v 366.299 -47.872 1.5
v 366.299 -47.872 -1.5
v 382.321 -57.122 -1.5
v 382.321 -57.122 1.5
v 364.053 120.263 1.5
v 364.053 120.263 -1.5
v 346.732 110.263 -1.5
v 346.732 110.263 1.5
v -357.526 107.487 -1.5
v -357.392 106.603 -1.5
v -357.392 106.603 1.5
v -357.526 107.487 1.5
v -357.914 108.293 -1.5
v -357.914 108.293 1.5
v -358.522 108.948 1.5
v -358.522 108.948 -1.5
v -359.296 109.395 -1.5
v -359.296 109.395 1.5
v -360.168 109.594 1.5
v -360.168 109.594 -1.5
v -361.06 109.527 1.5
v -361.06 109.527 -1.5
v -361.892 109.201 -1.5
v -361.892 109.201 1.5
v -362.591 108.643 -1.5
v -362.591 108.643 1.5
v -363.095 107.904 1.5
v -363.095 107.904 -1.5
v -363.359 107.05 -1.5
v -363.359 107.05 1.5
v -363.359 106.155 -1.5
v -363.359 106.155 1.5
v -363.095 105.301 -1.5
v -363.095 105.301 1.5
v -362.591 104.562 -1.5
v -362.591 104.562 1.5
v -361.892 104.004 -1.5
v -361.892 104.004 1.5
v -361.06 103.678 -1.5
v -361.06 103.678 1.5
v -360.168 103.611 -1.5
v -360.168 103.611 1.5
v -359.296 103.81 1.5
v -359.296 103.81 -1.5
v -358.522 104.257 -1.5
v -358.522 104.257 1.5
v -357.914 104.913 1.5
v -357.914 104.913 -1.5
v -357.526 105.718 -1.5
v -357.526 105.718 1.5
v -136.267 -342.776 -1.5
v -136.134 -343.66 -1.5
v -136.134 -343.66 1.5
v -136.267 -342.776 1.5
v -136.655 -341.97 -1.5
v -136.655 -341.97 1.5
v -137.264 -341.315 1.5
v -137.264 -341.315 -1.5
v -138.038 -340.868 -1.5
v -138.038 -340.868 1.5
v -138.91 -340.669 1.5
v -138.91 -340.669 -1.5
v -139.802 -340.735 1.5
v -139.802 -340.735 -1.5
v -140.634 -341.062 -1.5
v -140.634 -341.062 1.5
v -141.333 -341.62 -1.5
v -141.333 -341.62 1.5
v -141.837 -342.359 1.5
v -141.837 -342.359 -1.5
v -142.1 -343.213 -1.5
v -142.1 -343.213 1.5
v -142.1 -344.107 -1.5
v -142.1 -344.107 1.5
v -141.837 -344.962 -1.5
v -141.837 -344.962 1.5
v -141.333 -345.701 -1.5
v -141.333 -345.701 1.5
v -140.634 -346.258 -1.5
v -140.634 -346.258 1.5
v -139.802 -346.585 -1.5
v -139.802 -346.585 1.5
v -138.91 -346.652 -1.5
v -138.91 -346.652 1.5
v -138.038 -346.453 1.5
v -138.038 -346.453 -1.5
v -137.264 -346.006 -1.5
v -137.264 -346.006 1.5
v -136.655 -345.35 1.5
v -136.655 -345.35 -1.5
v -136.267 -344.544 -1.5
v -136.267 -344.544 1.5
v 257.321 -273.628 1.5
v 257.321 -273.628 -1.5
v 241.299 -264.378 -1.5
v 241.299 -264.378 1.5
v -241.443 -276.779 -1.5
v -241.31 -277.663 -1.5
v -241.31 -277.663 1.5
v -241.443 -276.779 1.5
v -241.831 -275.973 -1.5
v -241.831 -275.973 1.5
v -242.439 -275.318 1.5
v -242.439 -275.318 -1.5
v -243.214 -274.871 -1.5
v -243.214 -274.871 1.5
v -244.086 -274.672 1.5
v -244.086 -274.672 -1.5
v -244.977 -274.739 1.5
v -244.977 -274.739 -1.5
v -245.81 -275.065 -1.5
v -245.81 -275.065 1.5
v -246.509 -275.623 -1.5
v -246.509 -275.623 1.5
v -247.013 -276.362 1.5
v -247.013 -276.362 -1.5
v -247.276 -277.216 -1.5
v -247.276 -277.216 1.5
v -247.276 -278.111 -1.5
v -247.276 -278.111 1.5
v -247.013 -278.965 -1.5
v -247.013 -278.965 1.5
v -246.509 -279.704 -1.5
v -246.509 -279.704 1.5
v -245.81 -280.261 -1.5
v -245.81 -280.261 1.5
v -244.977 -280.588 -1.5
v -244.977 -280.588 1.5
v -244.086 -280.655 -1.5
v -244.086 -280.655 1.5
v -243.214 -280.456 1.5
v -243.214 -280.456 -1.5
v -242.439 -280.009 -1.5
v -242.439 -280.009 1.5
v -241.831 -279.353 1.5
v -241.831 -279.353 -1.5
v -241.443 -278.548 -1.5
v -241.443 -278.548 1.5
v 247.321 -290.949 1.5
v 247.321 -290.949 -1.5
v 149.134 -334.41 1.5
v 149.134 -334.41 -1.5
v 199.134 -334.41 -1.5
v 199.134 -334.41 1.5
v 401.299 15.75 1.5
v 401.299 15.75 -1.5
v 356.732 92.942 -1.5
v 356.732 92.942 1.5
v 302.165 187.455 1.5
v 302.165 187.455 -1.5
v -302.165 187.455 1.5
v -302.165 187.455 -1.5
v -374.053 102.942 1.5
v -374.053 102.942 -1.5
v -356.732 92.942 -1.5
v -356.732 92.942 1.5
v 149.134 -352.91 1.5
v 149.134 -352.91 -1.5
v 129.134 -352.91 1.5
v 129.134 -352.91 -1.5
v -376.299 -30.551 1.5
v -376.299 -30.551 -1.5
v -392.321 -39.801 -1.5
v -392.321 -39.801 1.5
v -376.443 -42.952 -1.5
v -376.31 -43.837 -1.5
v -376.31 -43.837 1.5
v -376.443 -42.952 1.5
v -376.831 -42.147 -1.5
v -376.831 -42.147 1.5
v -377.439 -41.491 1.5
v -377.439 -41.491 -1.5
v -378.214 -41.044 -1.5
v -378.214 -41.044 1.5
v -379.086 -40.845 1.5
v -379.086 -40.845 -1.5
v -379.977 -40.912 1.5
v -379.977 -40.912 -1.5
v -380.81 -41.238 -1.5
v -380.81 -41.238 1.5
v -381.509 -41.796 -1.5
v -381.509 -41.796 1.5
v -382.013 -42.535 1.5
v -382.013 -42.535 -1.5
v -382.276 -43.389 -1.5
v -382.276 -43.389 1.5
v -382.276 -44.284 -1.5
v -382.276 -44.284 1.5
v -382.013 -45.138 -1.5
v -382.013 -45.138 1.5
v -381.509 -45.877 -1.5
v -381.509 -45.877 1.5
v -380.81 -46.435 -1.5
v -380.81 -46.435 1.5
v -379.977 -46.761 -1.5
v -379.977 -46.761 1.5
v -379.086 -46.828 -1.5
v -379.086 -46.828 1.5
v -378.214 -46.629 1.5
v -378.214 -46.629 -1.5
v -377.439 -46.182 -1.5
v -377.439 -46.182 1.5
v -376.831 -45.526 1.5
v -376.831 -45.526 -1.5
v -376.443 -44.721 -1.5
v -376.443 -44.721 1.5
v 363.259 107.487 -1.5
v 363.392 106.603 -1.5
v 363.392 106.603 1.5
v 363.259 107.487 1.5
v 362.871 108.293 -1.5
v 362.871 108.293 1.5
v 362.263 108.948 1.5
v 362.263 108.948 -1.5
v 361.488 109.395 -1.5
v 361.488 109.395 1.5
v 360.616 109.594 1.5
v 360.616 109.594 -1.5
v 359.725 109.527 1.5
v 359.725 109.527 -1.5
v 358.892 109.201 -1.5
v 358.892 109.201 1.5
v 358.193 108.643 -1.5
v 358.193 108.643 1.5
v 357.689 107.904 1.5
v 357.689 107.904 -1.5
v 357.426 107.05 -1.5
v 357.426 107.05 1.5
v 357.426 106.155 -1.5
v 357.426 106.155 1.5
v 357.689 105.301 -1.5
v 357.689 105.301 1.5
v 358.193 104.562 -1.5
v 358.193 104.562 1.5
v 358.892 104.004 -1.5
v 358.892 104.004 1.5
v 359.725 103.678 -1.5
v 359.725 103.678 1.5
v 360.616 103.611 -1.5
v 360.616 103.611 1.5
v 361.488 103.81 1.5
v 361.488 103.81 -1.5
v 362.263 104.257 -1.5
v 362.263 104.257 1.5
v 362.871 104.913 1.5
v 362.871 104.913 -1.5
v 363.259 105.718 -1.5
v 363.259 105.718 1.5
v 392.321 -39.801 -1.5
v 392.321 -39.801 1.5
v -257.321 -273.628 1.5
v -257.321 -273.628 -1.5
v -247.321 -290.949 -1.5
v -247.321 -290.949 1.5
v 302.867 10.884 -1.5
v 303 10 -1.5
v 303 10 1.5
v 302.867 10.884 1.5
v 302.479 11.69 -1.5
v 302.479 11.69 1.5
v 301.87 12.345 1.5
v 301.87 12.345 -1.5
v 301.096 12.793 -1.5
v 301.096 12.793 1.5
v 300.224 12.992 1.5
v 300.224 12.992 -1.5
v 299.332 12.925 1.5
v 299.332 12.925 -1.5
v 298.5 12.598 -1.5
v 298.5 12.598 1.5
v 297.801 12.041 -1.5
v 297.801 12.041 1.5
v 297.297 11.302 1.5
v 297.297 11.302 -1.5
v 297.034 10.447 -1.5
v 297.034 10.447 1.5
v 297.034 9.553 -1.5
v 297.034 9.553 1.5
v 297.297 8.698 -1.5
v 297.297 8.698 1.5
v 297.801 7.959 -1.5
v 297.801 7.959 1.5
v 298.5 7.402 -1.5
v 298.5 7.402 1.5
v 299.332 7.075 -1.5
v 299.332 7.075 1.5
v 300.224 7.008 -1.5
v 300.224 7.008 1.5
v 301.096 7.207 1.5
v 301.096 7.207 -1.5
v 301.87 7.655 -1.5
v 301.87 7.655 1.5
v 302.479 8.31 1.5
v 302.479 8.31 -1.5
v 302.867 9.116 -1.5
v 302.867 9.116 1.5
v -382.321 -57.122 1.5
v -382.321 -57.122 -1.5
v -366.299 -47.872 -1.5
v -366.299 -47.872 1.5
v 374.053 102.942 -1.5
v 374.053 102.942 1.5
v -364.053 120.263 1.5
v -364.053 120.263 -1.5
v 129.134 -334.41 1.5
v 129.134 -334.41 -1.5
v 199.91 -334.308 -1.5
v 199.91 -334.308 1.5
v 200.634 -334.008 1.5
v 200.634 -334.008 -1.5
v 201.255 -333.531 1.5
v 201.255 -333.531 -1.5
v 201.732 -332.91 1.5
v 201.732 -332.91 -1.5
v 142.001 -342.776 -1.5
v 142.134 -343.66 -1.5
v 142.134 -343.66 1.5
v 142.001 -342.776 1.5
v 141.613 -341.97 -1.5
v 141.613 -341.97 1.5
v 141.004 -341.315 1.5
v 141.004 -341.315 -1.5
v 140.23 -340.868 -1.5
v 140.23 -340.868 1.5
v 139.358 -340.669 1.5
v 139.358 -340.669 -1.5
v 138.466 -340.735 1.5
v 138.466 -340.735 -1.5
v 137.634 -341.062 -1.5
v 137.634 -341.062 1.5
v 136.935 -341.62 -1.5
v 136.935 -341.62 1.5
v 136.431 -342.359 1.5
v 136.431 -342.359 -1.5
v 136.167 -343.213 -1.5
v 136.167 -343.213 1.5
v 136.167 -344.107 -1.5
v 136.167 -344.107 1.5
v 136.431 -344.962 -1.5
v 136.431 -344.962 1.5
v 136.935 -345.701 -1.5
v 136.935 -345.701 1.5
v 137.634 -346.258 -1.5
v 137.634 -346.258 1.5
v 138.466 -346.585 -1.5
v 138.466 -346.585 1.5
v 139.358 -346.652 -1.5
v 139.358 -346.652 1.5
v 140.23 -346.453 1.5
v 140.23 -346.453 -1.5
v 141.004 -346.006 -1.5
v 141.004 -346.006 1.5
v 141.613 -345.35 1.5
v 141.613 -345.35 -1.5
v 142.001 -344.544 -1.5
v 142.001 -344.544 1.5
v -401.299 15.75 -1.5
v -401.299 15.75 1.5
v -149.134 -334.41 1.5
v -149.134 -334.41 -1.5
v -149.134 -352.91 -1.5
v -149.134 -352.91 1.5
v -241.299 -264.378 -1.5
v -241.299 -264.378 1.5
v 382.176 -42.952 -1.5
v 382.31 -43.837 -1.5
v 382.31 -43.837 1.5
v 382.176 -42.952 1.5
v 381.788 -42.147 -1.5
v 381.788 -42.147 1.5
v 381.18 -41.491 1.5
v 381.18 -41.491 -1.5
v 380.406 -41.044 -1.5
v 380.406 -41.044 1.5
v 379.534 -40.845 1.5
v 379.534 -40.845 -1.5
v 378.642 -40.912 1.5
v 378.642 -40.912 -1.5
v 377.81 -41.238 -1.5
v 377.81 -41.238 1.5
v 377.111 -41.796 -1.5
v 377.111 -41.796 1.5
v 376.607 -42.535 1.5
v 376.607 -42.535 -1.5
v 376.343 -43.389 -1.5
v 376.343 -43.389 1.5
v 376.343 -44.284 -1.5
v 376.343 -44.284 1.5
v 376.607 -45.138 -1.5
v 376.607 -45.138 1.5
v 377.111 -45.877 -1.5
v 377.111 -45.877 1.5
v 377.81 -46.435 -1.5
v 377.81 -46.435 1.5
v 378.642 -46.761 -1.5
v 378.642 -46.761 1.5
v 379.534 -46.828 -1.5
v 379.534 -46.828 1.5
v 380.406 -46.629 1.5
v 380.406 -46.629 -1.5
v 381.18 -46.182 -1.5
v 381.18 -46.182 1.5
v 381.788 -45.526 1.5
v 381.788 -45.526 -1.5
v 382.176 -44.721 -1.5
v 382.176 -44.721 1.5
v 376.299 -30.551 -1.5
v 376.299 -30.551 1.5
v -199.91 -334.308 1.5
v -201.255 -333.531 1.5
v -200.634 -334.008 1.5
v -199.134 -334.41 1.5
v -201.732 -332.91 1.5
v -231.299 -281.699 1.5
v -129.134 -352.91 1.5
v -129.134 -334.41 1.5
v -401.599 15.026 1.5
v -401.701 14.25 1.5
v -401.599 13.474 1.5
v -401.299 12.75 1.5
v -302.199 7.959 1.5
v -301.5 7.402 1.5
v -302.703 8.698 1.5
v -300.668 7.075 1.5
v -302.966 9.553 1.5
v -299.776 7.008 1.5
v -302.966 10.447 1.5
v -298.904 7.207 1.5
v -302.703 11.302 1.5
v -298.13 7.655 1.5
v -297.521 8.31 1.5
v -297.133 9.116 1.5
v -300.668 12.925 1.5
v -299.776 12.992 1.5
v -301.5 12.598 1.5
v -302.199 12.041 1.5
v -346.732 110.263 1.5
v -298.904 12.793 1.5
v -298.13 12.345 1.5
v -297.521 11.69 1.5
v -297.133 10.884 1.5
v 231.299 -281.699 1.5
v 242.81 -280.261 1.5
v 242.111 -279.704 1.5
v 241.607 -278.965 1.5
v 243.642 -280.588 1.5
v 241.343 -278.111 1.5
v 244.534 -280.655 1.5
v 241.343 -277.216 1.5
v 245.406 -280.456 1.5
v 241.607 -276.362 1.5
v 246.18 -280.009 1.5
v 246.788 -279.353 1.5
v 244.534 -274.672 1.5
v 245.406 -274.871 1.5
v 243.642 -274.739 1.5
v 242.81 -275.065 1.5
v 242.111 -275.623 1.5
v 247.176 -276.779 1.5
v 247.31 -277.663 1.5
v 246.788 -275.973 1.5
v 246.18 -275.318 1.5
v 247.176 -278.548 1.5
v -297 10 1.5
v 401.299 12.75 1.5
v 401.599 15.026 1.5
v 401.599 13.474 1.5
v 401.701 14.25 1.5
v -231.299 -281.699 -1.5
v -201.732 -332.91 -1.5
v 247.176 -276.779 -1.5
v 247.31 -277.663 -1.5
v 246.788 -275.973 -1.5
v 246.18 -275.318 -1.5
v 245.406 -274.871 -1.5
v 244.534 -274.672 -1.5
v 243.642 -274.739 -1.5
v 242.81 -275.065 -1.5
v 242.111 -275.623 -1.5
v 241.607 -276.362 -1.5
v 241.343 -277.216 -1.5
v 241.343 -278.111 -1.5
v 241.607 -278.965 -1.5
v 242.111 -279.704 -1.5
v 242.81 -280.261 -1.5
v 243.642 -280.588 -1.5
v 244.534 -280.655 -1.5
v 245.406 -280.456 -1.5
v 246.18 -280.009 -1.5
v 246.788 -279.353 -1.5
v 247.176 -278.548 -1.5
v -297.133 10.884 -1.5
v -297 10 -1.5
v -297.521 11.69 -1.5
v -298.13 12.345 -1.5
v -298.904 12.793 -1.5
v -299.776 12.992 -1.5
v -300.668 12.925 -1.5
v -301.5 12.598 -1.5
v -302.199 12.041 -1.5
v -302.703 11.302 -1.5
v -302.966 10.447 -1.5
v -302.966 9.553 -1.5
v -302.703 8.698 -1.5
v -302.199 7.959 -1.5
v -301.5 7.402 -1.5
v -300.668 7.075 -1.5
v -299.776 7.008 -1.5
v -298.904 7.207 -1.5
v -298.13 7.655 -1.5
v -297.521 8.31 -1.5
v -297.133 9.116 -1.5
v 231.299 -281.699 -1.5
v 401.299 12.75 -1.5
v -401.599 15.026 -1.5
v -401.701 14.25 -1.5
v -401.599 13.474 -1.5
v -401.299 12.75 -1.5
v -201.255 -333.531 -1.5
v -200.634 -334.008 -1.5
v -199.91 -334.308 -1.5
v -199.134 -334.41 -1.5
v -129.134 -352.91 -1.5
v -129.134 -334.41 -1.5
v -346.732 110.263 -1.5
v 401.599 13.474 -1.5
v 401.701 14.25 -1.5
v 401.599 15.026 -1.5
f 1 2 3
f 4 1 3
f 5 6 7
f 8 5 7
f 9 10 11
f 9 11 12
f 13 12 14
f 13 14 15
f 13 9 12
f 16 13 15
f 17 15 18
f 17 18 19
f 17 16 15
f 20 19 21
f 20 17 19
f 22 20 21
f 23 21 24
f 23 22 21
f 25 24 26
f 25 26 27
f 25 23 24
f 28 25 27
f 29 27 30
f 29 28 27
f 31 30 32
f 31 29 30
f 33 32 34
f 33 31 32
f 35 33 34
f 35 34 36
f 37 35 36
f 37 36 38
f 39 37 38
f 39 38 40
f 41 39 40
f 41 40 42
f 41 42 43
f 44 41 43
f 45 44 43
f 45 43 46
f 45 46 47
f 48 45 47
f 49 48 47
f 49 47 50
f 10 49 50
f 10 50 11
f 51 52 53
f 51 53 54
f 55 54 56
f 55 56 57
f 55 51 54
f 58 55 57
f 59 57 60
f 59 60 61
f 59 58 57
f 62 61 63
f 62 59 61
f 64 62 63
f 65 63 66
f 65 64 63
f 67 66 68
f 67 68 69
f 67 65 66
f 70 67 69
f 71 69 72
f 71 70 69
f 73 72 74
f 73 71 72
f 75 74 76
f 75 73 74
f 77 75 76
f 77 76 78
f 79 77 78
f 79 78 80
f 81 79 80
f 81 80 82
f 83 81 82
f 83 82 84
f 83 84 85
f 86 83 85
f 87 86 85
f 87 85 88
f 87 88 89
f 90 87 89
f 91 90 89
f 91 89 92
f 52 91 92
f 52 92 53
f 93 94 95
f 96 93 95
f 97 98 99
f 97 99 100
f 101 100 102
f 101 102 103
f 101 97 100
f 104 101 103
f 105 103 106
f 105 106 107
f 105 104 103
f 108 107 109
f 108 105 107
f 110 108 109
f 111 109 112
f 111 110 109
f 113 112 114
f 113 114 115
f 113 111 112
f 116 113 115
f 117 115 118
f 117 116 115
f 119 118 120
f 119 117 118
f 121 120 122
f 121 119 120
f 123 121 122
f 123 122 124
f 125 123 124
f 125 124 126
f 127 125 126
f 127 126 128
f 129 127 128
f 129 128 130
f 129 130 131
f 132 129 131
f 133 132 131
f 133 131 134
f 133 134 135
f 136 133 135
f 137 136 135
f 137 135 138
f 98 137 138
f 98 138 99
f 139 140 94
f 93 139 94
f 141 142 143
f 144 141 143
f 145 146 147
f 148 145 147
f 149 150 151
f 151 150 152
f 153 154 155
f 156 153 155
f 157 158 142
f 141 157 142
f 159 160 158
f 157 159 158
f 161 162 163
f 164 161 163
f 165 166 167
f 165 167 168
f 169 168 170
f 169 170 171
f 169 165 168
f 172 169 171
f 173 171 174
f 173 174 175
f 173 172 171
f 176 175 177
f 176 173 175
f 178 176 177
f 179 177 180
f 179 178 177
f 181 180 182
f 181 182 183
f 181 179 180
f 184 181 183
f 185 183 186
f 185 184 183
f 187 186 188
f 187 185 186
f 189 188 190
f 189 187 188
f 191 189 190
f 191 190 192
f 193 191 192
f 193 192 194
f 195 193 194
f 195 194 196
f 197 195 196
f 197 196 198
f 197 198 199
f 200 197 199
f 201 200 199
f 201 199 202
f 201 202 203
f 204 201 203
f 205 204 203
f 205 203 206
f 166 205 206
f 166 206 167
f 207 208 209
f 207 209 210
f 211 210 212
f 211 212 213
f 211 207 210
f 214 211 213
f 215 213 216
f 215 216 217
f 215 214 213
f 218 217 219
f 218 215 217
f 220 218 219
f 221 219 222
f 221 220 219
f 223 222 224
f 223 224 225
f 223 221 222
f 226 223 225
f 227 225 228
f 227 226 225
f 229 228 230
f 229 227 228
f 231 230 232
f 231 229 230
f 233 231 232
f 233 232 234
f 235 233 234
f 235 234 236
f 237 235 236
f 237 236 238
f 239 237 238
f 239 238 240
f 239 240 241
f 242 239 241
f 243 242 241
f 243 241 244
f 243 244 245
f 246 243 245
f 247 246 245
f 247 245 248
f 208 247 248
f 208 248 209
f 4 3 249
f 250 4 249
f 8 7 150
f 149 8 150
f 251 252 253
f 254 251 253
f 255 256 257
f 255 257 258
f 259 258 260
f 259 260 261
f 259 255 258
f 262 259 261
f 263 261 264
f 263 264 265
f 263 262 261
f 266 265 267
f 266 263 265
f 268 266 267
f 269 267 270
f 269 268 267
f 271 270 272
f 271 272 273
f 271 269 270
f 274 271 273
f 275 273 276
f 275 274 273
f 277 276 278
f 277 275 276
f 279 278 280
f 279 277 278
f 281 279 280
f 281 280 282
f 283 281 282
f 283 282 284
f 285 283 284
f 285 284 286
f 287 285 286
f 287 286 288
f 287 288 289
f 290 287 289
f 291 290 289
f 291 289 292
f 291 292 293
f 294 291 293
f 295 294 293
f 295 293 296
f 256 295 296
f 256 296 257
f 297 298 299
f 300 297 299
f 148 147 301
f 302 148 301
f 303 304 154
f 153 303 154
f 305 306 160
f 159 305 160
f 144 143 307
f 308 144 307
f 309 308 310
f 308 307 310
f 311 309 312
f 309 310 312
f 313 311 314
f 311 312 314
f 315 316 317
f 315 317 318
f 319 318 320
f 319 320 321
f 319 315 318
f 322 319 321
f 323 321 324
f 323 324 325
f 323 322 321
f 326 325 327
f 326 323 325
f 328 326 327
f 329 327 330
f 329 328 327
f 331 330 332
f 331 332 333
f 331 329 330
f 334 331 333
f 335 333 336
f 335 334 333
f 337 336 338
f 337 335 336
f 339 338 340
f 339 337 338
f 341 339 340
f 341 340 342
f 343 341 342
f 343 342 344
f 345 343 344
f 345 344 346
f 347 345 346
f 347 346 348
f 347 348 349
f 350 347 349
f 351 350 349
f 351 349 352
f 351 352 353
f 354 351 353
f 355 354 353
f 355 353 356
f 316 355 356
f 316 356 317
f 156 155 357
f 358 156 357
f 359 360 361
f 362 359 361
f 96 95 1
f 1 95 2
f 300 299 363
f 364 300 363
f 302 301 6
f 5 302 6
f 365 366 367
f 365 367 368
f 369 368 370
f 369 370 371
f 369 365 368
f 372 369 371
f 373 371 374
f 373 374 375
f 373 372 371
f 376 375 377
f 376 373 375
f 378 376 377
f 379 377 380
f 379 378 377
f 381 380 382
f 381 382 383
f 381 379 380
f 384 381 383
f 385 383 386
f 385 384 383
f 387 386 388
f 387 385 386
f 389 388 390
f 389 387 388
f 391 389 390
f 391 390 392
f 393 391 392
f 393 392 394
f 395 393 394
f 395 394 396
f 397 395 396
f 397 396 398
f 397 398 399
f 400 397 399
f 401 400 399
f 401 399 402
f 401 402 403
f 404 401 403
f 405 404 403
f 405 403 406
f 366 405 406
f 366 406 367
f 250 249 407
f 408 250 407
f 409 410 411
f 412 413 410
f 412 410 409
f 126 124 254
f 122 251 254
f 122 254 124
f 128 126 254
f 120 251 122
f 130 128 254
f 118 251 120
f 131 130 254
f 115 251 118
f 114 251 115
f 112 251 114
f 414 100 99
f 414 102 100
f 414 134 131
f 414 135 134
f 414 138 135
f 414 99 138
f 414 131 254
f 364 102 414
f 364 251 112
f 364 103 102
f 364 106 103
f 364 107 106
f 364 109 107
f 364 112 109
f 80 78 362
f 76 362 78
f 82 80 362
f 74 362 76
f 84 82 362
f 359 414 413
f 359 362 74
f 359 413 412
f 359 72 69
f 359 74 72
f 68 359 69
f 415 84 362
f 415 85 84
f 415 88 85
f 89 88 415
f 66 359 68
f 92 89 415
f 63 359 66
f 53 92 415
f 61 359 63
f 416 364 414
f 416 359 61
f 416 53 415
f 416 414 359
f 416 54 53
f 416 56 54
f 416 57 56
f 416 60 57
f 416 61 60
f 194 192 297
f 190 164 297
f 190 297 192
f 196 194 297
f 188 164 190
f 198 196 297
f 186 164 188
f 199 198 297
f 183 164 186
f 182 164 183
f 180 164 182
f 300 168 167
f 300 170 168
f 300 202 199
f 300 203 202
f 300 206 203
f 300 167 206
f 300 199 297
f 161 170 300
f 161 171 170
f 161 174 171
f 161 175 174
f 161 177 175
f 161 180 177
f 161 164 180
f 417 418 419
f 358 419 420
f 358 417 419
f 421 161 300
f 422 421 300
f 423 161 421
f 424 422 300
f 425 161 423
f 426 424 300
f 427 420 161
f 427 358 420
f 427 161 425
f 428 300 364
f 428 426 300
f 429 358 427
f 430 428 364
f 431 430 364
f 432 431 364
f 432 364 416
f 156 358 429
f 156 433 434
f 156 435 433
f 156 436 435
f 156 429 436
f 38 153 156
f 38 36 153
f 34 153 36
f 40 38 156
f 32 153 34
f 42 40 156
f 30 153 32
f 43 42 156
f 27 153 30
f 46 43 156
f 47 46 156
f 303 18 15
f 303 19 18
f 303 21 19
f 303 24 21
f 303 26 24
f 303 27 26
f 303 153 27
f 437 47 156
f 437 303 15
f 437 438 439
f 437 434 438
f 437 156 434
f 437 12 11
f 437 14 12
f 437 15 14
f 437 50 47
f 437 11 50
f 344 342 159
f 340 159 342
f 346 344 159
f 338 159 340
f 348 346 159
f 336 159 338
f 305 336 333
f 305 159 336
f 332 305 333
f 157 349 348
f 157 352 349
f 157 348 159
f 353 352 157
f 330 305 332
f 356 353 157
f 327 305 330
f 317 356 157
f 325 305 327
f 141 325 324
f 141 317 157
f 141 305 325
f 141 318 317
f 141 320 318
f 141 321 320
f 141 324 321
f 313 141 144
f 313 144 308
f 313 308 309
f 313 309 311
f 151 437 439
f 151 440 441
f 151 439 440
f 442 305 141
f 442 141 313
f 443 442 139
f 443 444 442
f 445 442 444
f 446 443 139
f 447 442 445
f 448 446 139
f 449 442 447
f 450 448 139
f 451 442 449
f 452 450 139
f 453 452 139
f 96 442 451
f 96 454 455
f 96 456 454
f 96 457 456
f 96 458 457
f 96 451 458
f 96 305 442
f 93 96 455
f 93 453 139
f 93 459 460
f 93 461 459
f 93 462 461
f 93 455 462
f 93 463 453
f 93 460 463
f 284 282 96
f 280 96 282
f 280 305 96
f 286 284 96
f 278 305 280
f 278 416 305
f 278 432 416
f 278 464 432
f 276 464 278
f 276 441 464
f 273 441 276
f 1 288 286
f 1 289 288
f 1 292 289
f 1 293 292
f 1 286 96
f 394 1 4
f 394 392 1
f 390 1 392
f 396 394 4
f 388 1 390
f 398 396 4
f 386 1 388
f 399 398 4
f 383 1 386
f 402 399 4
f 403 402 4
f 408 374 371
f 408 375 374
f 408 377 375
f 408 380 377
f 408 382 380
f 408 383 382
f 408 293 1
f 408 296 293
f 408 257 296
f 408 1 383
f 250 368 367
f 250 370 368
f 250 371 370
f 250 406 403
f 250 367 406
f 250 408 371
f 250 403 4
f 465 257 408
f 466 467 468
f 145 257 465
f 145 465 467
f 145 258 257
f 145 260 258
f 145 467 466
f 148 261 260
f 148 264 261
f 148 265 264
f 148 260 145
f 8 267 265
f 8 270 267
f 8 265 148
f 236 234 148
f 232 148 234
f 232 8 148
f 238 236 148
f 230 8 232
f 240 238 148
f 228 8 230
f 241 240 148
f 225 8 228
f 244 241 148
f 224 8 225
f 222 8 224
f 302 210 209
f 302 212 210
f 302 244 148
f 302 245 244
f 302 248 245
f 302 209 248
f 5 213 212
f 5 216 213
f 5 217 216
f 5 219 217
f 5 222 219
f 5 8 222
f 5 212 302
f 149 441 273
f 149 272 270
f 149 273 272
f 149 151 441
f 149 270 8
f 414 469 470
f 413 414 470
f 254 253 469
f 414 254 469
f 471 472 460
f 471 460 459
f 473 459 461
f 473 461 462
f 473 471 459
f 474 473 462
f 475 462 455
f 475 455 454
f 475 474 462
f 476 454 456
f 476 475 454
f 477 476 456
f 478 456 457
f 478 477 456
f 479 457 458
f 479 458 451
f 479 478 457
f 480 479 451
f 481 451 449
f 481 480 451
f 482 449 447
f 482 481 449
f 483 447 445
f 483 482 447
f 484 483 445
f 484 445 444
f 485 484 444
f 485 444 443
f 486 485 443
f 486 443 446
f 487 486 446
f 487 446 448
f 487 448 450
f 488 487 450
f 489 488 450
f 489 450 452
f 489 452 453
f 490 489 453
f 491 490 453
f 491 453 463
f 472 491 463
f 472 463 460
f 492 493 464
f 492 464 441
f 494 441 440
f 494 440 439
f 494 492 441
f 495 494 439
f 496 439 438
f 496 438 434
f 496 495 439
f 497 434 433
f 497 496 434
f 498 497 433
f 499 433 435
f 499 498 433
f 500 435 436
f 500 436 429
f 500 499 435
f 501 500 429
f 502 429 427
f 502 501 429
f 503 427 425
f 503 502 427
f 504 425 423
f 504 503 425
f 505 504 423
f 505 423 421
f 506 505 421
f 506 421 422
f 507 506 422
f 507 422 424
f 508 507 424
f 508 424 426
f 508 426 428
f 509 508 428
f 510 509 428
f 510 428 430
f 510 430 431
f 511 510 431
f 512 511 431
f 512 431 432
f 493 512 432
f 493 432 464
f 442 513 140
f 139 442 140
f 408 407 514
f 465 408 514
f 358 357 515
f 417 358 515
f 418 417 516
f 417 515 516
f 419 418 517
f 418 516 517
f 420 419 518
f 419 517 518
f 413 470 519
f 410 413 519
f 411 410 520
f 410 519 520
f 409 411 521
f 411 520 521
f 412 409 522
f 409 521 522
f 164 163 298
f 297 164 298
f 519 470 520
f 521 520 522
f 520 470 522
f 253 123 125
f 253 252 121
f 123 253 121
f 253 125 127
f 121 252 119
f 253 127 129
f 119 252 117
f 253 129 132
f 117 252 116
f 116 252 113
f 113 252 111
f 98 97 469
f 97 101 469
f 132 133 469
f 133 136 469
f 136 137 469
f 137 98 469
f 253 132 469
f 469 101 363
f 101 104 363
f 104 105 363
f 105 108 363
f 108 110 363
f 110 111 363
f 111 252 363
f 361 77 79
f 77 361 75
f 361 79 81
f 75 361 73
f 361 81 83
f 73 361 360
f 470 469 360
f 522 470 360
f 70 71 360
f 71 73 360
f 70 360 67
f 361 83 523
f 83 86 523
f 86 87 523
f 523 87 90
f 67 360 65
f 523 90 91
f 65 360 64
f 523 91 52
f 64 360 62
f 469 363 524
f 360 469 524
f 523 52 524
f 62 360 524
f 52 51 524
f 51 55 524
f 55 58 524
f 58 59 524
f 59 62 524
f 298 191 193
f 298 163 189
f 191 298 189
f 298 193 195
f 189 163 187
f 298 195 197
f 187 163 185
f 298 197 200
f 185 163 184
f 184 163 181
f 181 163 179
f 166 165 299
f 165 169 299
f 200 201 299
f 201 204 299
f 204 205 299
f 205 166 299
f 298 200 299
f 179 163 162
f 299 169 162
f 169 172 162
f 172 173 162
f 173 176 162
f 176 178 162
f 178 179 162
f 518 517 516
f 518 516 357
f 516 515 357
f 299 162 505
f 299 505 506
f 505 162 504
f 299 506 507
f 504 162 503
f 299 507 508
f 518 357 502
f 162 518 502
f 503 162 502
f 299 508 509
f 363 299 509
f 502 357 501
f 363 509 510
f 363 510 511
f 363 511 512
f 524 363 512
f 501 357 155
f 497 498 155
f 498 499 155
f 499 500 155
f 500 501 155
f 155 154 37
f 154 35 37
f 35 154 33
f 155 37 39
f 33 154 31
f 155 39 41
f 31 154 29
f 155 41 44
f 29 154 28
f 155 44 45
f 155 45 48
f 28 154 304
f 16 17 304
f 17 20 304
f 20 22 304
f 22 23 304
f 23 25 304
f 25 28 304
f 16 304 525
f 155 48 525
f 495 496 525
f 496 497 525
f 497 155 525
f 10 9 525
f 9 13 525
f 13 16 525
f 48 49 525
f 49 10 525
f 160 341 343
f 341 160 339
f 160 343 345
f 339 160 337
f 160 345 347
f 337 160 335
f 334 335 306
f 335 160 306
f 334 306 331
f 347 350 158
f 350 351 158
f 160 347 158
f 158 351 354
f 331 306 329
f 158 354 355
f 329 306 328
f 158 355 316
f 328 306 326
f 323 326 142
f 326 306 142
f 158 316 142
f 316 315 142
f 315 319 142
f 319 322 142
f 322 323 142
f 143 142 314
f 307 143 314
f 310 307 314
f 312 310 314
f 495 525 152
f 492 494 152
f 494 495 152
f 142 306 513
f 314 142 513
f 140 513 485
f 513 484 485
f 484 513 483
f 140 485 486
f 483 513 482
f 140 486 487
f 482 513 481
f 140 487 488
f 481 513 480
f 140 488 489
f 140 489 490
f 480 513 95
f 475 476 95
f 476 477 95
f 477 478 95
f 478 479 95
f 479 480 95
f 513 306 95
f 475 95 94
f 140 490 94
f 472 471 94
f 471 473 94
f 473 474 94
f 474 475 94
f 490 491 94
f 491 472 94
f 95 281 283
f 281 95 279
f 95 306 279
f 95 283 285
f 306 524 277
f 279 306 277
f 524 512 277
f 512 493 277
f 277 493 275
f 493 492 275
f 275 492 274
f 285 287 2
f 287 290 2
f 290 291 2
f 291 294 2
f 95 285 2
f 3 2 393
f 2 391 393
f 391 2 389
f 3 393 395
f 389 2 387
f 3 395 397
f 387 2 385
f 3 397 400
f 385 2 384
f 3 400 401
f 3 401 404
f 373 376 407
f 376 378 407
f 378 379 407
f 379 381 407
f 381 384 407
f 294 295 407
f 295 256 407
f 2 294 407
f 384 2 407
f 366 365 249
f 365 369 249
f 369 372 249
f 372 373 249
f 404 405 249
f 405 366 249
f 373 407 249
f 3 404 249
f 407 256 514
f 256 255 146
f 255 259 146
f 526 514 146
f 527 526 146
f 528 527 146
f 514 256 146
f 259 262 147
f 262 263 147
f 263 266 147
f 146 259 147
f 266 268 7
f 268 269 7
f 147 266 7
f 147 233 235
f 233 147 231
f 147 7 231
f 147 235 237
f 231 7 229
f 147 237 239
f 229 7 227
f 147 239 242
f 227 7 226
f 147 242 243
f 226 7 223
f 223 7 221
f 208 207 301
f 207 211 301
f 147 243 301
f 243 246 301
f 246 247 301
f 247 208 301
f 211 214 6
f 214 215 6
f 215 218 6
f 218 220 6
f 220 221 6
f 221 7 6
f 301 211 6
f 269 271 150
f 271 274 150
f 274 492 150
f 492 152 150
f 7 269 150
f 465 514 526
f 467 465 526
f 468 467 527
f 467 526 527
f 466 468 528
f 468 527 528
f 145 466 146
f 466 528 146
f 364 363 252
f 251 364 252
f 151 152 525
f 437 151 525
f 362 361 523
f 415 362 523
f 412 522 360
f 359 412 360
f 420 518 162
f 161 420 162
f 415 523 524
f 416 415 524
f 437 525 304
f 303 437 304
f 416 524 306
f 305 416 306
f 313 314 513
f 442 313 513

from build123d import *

# Parameters (mm, degrees)
SKETCH_1_R              = 3
EXTRUDE_1_DEPTH         = 1.5
SHEET_START             = -1.5
SHEET_METAL_1_OUTLINE_R = 3
SHEET_METAL_1_DEPTH     = 1.5


# Read off the part's stored shape, not the designer's step: Преобразовать-Твердое тело1
with BuildPart() as part:
    # Sketch 1 → Бобышка-Вытянуть1 (new body)
    with BuildSketch(Plane.XY):
        with BuildLine():
            Line((201.732050808, -332.910161514), (231.299038106, -281.698637287))
            Line((231.299038106, -281.698637287), (247.320508076, -290.948637287))
            Line((247.320508076, -290.948637287), (257.320508076, -273.628129211))
            Line((257.320508076, -273.628129211), (241.299038106, -264.378129211))
            Line((241.299038106, -264.378129211), (366.299038106, -47.871778265))
            Line((366.299038106, -47.871778265), (382.320508076, -57.121778265))
            Line((382.320508076, -57.121778265), (392.320508076, -39.801270189))
            Line((392.320508076, -39.801270189), (376.299038106, -30.551270189))
            Line((376.299038106, -30.551270189), (401.299038106, 12.75))
            ThreePointArc((401.299038106, 12.75), (401.700961894, 14.25), (401.299038106, 15.75))
            Line((401.299038106, 15.75), (356.732050808, 92.942286341))
            Line((356.732050808, 92.942286341), (374.052558883, 102.942286341))
            Line((374.052558883, 102.942286341), (364.052558883, 120.262794416))
            Line((364.052558883, 120.262794416), (346.732050808, 110.262794416))
            Line((346.732050808, 110.262794416), (302.165063509, 187.455080757))
            Line((302.165063509, 187.455080757), (-302.165063509, 187.455080757))
            Line((-302.165063509, 187.455080757), (-346.732050808, 110.262794416))
            Line((-346.732050808, 110.262794416), (-364.052558883, 120.262794416))
            Line((-364.052558883, 120.262794416), (-374.052558883, 102.942286341))
            Line((-374.052558883, 102.942286341), (-356.732050808, 92.942286341))
            Line((-356.732050808, 92.942286341), (-401.299038106, 15.75))
            ThreePointArc((-401.299038106, 15.75), (-401.700961894, 14.25), (-401.299038106, 12.75))
            Line((-401.299038106, 12.75), (-376.299038106, -30.551270189))
            Line((-376.299038106, -30.551270189), (-392.320508076, -39.801270189))
            Line((-392.320508076, -39.801270189), (-382.320508076, -57.121778265))
            Line((-382.320508076, -57.121778265), (-366.299038106, -47.871778265))
            Line((-366.299038106, -47.871778265), (-241.299038106, -264.378129211))
            Line((-241.299038106, -264.378129211), (-257.320508076, -273.628129211))
            Line((-257.320508076, -273.628129211), (-247.320508076, -290.948637287))
            Line((-247.320508076, -290.948637287), (-231.299038106, -281.698637287))
            Line((-231.299038106, -281.698637287), (-201.732050808, -332.910161514))
            ThreePointArc((-201.732050808, -332.910161514), (-200.633974596, -334.008237725), (-199.133974596, -334.410161514))
            Line((-199.133974596, -334.410161514), (-149.133974596, -334.410161514))
            Line((-149.133974596, -334.410161514), (-149.133974596, -352.910161514))
            Line((-149.133974596, -352.910161514), (-129.133974596, -352.910161514))
            Line((-129.133974596, -352.910161514), (-129.133974596, -334.410161514))
            Line((-129.133974596, -334.410161514), (129.133974596, -334.410161514))
            Line((129.133974596, -334.410161514), (129.133974596, -352.910161514))
            Line((129.133974596, -352.910161514), (149.133974596, -352.910161514))
            Line((149.133974596, -352.910161514), (149.133974596, -334.410161514))
            Line((149.133974596, -334.410161514), (199.133974596, -334.410161514))
            ThreePointArc((199.133974596, -334.410161514), (200.633974596, -334.008237725), (201.732050808, -332.910161514))
        make_face()
        with Locations((244.309773091, -277.663383249)):
            Circle(SKETCH_1_R, mode=Mode.SUBTRACT)
        with Locations((379.309773091, -43.836524227)):
            Circle(SKETCH_1_R, mode=Mode.SUBTRACT)
        with Locations((139.133974596, -343.660161514)):
            Circle(SKETCH_1_R, mode=Mode.SUBTRACT)
        with Locations((-139.133974596, -343.660161514)):
            Circle(SKETCH_1_R, mode=Mode.SUBTRACT)
        with Locations((-244.309773091, -277.663383249)):
            Circle(SKETCH_1_R, mode=Mode.SUBTRACT)
        with Locations((-379.309773091, -43.836524227)):
            Circle(SKETCH_1_R, mode=Mode.SUBTRACT)
        with Locations((300, 10)):
            Circle(SKETCH_1_R, mode=Mode.SUBTRACT)
        with Locations((-300, 10)):
            Circle(SKETCH_1_R, mode=Mode.SUBTRACT)
        with Locations((-360.392304845, 106.602540379)):
            Circle(SKETCH_1_R, mode=Mode.SUBTRACT)
        with Locations((360.392304845, 106.602540379)):
            Circle(SKETCH_1_R, mode=Mode.SUBTRACT)
    extrude(amount=EXTRUDE_1_DEPTH)

    # Sheet Metal 1 outline → Sheet Metal 1 (add)
    with BuildSketch(Plane.XY.offset(SHEET_START)):
        with BuildLine():
            Line((-199.133974596, -334.410161514), (-149.133974596, -334.410161514))
            Line((-149.133974596, -334.410161514), (-149.133974596, -352.910161514))
            Line((-149.133974596, -352.910161514), (-129.133974596, -352.910161514))
            Line((-129.133974596, -352.910161514), (-129.133974596, -334.410161514))
            Line((-129.133974596, -334.410161514), (129.133974596, -334.410161514))
            Line((129.133974596, -334.410161514), (129.133974596, -352.910161514))
            Line((129.133974596, -352.910161514), (149.133974596, -352.910161514))
            Line((149.133974596, -352.910161514), (149.133974596, -334.410161514))
            Line((149.133974596, -334.410161514), (199.133974596, -334.410161514))
            ThreePointArc((199.133974596, -334.410161514), (200.633974596, -334.008237725), (201.732050808, -332.910161514))
            Line((201.732050808, -332.910161514), (231.299038106, -281.698637287))
            Line((231.299038106, -281.698637287), (247.320508076, -290.948637287))
            Line((247.320508076, -290.948637287), (257.320508076, -273.628129211))
            Line((257.320508076, -273.628129211), (241.299038106, -264.378129211))
            Line((241.299038106, -264.378129211), (366.299038106, -47.871778265))
            Line((366.299038106, -47.871778265), (382.320508076, -57.121778265))
            Line((382.320508076, -57.121778265), (392.320508076, -39.801270189))
            Line((392.320508076, -39.801270189), (376.299038106, -30.551270189))
            Line((376.299038106, -30.551270189), (401.299038106, 12.75))
            ThreePointArc((401.299038106, 12.75), (401.700961894, 14.25), (401.299038106, 15.75))
            Line((401.299038106, 15.75), (356.732050808, 92.942286341))
            Line((356.732050808, 92.942286341), (374.052558883, 102.942286341))
            Line((374.052558883, 102.942286341), (364.052558883, 120.262794416))
            Line((364.052558883, 120.262794416), (346.732050808, 110.262794416))
            Line((346.732050808, 110.262794416), (302.165063509, 187.455080757))
            Line((302.165063509, 187.455080757), (-302.165063509, 187.455080757))
            Line((-302.165063509, 187.455080757), (-346.732050808, 110.262794416))
            Line((-346.732050808, 110.262794416), (-364.052558883, 120.262794416))
            Line((-364.052558883, 120.262794416), (-374.052558883, 102.942286341))
            Line((-374.052558883, 102.942286341), (-356.732050808, 92.942286341))
            Line((-356.732050808, 92.942286341), (-401.299038106, 15.75))
            ThreePointArc((-401.299038106, 15.75), (-401.700961894, 14.25), (-401.299038106, 12.75))
            Line((-401.299038106, 12.75), (-376.299038106, -30.551270189))
            Line((-376.299038106, -30.551270189), (-392.320508076, -39.801270189))
            Line((-392.320508076, -39.801270189), (-382.320508076, -57.121778265))
            Line((-382.320508076, -57.121778265), (-366.299038106, -47.871778265))
            Line((-366.299038106, -47.871778265), (-241.299038106, -264.378129211))
            Line((-241.299038106, -264.378129211), (-257.320508076, -273.628129211))
            Line((-257.320508076, -273.628129211), (-247.320508076, -290.948637287))
            Line((-247.320508076, -290.948637287), (-231.299038106, -281.698637287))
            Line((-231.299038106, -281.698637287), (-201.732050808, -332.910161514))
            ThreePointArc((-201.732050808, -332.910161514), (-200.633974596, -334.008237725), (-199.133974596, -334.410161514))
        make_face()
        with Locations((-244.309773091, -277.663383249)):
            Circle(SHEET_METAL_1_OUTLINE_R, mode=Mode.SUBTRACT)
        with Locations((-139.133974596, -343.660161514)):
            Circle(SHEET_METAL_1_OUTLINE_R, mode=Mode.SUBTRACT)
        with Locations((139.133974596, -343.660161514)):
            Circle(SHEET_METAL_1_OUTLINE_R, mode=Mode.SUBTRACT)
        with Locations((244.309773091, -277.663383249)):
            Circle(SHEET_METAL_1_OUTLINE_R, mode=Mode.SUBTRACT)
        with Locations((-379.309773091, -43.836524227)):
            Circle(SHEET_METAL_1_OUTLINE_R, mode=Mode.SUBTRACT)
        with Locations((-300, 10)):
            Circle(SHEET_METAL_1_OUTLINE_R, mode=Mode.SUBTRACT)
        with Locations((-360.392304845, 106.602540379)):
            Circle(SHEET_METAL_1_OUTLINE_R, mode=Mode.SUBTRACT)
        with Locations((379.309773091, -43.836524227)):
            Circle(SHEET_METAL_1_OUTLINE_R, mode=Mode.SUBTRACT)
        with Locations((300, 10)):
            Circle(SHEET_METAL_1_OUTLINE_R, mode=Mode.SUBTRACT)
        with Locations((360.392304845, 106.602540379)):
            Circle(SHEET_METAL_1_OUTLINE_R, mode=Mode.SUBTRACT)
    extrude(amount=SHEET_METAL_1_DEPTH)


solid = part.part
